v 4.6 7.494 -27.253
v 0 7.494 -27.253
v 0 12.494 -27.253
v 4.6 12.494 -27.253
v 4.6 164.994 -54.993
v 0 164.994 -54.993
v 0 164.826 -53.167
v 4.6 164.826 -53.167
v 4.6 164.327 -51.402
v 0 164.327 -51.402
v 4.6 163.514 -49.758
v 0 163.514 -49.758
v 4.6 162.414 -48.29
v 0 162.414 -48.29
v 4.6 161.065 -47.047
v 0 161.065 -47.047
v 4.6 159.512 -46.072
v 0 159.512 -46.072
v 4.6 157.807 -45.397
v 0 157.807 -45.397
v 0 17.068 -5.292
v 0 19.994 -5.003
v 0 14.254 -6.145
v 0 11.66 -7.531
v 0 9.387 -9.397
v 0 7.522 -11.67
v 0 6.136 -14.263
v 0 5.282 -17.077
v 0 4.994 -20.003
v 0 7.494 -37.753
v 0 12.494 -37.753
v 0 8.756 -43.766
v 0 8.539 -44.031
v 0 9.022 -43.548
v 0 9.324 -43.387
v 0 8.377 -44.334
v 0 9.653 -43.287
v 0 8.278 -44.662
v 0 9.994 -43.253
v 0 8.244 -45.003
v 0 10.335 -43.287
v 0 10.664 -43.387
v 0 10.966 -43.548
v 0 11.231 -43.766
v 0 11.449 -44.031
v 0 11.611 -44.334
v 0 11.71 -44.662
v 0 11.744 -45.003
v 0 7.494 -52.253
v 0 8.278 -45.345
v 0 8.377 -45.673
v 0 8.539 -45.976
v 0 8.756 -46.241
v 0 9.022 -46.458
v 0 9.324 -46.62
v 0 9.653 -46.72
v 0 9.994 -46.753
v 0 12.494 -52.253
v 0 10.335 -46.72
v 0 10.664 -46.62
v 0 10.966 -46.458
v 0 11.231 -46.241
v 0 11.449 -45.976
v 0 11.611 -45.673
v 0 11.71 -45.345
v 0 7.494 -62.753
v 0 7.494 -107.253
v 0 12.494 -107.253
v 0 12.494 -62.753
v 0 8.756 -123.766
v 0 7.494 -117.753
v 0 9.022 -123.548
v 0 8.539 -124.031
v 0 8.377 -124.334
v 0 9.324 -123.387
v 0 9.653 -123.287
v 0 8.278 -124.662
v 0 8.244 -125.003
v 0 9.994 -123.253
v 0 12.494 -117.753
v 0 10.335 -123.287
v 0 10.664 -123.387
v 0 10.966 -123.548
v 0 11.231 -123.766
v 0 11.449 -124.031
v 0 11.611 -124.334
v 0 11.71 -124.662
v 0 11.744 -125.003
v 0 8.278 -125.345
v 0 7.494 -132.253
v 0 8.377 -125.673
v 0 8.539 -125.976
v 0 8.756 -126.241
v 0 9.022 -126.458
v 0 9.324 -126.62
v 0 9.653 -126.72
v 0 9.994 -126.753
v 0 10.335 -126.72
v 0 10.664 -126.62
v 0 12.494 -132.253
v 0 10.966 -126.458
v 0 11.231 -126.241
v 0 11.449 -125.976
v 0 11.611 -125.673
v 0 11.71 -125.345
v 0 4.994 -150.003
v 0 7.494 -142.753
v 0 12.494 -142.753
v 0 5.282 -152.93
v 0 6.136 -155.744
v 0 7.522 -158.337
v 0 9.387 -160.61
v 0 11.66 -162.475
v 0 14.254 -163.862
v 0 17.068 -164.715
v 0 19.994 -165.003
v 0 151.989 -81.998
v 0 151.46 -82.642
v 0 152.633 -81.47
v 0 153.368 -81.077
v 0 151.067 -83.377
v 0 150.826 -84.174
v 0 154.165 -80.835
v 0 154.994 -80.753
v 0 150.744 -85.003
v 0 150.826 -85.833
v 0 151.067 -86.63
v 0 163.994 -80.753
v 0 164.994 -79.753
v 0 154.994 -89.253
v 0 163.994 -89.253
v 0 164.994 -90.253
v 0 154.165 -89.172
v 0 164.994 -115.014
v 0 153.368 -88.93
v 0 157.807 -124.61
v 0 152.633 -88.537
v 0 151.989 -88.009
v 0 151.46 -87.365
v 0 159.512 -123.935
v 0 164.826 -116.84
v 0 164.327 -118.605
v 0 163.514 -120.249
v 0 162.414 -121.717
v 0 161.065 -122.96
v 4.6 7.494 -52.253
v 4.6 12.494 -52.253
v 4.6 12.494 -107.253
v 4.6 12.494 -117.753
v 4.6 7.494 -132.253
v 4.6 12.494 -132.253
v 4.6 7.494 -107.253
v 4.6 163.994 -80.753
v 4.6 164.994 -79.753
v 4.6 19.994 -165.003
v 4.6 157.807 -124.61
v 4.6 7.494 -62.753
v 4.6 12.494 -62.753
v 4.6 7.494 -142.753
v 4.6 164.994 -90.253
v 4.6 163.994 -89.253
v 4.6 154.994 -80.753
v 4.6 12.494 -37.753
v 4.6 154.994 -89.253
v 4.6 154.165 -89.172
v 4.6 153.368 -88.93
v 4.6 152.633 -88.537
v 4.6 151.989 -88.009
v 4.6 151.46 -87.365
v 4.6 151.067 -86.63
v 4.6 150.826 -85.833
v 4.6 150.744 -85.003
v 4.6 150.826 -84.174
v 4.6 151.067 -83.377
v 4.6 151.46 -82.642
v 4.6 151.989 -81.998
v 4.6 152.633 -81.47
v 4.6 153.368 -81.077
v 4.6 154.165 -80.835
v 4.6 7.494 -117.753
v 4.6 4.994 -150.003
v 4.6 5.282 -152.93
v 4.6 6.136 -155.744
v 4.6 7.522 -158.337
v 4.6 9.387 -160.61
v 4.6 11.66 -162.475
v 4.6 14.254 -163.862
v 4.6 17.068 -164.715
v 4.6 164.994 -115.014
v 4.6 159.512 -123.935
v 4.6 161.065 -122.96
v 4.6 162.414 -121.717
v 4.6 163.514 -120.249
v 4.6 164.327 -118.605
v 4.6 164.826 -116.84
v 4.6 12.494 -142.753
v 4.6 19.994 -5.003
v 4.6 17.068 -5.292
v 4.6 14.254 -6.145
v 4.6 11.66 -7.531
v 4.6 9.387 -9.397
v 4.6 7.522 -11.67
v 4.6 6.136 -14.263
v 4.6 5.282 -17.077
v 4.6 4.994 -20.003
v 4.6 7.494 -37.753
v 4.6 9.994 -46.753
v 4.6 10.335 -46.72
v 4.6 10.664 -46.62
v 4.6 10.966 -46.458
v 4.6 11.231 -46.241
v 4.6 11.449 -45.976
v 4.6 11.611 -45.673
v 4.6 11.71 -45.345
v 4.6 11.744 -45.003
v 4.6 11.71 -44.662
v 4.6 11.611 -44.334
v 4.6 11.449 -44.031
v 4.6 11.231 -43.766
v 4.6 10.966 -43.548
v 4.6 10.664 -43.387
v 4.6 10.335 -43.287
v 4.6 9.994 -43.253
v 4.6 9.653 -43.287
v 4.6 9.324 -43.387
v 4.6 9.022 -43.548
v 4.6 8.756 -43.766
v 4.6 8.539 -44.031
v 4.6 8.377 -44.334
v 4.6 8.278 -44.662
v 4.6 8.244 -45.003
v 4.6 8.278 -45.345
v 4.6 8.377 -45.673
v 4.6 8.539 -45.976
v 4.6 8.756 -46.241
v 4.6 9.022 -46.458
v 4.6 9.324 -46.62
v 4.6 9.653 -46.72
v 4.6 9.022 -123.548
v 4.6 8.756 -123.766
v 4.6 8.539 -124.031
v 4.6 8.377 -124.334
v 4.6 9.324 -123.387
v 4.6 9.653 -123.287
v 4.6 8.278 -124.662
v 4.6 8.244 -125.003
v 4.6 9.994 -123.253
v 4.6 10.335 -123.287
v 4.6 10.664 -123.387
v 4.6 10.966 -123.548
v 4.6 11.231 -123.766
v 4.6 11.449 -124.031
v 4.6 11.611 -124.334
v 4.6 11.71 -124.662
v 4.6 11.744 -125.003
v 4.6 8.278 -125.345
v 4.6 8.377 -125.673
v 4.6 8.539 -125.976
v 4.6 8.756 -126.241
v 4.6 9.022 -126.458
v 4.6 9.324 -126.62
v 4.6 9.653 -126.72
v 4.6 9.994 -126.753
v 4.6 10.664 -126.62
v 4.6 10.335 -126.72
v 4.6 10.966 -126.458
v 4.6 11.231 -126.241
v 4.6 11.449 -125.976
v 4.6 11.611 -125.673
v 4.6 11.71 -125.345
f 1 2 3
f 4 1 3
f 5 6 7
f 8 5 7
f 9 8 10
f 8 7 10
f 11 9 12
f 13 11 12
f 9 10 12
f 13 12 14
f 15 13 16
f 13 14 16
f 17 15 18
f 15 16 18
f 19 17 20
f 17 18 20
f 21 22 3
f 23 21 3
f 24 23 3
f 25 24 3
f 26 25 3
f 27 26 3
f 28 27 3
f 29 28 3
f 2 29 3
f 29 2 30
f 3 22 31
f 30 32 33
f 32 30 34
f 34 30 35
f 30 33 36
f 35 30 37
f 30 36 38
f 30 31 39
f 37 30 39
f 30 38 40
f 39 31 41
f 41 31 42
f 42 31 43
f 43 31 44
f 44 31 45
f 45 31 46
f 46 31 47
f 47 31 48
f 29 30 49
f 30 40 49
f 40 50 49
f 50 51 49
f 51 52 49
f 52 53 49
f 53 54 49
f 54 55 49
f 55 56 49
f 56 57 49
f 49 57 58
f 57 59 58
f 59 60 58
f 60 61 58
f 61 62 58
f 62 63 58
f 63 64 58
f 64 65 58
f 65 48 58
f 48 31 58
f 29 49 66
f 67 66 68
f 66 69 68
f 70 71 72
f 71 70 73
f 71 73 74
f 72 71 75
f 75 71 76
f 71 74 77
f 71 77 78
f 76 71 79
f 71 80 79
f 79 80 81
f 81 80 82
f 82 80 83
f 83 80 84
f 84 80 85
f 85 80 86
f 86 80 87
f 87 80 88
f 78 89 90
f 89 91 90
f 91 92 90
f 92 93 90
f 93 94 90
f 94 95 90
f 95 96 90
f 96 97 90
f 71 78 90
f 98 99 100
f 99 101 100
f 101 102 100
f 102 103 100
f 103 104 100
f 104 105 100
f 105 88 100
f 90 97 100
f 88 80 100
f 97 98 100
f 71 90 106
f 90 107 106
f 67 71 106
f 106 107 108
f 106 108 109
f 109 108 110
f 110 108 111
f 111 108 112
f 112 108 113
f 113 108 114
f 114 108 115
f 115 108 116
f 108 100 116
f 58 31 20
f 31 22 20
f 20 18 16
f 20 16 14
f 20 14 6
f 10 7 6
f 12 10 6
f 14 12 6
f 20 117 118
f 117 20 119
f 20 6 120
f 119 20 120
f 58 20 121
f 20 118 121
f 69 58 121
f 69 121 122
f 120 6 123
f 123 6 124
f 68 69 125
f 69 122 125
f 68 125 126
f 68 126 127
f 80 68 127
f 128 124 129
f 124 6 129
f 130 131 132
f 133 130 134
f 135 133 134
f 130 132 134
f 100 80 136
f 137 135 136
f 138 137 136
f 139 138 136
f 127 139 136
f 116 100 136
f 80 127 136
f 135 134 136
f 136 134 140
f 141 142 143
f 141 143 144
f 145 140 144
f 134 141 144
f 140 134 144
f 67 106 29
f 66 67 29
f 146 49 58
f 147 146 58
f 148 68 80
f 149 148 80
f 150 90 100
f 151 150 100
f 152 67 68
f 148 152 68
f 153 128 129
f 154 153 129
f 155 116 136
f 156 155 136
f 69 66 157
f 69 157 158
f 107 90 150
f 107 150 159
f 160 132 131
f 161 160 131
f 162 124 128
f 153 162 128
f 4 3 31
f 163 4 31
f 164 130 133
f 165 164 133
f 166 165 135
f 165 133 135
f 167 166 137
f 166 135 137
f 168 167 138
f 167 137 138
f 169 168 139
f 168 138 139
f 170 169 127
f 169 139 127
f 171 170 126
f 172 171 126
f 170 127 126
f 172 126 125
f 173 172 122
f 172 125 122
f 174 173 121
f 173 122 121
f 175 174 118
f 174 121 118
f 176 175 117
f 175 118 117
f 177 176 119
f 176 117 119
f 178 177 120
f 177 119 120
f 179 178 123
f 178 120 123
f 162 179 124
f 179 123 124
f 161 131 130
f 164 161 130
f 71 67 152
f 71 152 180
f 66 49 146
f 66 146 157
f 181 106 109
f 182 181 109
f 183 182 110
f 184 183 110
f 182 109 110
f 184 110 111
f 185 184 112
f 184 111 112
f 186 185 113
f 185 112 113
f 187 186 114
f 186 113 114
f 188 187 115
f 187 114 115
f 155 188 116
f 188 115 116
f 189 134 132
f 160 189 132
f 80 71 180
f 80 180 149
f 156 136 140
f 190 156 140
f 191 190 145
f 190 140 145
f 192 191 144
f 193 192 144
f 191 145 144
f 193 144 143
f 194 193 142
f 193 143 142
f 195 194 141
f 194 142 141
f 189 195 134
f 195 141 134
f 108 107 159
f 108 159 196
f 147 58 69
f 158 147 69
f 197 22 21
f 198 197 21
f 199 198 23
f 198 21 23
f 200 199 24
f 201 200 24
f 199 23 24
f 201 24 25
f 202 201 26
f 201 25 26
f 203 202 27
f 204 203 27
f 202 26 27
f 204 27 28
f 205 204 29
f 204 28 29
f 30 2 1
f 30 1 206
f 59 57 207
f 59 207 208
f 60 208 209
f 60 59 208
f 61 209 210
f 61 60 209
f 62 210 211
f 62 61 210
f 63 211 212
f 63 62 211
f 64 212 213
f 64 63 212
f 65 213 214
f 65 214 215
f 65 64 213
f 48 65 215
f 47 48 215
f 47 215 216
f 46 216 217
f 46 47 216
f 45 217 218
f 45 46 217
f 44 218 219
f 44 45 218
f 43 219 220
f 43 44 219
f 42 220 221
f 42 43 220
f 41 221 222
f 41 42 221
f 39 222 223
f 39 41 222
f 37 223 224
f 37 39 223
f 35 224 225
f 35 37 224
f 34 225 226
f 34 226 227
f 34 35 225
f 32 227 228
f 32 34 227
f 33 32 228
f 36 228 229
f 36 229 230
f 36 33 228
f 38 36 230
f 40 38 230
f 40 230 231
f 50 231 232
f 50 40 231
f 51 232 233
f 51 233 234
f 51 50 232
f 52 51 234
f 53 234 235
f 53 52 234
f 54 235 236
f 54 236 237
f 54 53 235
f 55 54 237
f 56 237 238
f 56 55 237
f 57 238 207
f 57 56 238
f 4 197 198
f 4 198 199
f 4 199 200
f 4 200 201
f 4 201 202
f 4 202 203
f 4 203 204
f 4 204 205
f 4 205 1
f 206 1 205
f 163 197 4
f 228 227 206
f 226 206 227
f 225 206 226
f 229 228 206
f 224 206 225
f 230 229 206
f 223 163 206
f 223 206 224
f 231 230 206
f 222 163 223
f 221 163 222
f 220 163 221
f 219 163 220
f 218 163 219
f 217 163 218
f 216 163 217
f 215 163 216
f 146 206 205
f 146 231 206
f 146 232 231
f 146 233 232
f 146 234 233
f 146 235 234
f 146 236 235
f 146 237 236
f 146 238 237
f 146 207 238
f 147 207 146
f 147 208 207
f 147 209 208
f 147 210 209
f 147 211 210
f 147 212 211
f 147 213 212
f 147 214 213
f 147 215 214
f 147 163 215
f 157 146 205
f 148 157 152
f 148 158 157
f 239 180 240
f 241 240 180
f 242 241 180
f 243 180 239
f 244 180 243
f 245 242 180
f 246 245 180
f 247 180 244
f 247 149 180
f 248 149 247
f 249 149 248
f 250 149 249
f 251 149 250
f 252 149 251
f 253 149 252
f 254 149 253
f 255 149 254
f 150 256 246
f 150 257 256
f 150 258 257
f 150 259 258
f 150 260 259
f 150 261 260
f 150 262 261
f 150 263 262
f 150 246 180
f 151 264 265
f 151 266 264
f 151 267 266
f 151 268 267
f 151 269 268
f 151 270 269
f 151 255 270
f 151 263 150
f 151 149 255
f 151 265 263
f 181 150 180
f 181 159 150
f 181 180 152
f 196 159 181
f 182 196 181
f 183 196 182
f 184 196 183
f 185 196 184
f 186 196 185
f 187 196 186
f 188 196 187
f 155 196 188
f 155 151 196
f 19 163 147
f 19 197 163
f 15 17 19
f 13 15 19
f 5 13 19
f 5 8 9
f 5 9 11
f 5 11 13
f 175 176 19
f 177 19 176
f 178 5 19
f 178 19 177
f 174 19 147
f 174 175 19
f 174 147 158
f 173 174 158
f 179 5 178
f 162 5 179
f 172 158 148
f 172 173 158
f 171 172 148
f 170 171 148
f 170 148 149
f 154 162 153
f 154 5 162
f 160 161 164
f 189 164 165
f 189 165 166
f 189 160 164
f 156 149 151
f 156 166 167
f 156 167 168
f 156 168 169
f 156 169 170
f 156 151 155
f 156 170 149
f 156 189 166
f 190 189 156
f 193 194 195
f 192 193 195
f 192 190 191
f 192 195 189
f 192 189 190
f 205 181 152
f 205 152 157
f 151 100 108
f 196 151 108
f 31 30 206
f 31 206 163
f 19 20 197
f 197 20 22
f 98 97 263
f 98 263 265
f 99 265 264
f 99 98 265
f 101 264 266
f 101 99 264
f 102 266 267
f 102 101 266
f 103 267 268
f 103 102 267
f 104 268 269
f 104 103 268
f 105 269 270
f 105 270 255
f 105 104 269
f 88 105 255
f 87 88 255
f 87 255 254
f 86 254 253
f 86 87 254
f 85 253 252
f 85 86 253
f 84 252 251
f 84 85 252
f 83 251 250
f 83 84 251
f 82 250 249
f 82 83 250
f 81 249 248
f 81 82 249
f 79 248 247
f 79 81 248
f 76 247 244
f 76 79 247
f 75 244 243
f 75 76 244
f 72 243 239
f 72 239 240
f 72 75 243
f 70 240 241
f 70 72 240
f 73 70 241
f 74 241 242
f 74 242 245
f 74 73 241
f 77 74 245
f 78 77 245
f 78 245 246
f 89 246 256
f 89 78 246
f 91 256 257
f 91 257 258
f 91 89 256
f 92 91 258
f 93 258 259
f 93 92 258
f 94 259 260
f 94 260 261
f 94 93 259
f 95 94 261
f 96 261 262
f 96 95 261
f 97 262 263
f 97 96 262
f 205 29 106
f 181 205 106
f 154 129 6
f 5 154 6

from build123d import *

# Parameters (mm, degrees)
SKETCH1_R      = 1.75
SKETCH1_W      = 10.5
SKETCH1_H      = 5
EXTRUDE1_DEPTH = 4.6


with BuildPart() as part:
    # Sketch1 → Extrude1 (new body)
    with BuildSketch(Plane(origin=(0, 0, 0), x_dir=(0, 0, -1), z_dir=(1, 0, 0))):
        with BuildLine():
            Line((20.003411378, 4.993919491), (150.003411378, 4.993919491))
            ThreePointArc((150.003411378, 4.993919491), (160.610013096, 9.387317773), (165.003411378, 19.993919491))
            Line((165.003411378, 19.993919491), (124.610032516, 157.806623844))
            ThreePointArc((124.610032516, 157.806623844), (121.008451259, 162.997888617), (115.013747077, 164.993919491))
            Line((115.013747077, 164.993919491), (90.253411378, 164.993919491))
            Line((90.253411378, 164.993919491), (89.253411378, 163.993919491))
            Line((89.253411378, 163.993919491), (89.253411378, 154.993919491))
            ThreePointArc((89.253411378, 154.993919491), (85.003411378, 150.743919491), (80.753411378, 154.993919491))
            Line((80.753411378, 154.993919491), (80.753411378, 163.993919491))
            Line((80.753411378, 163.993919491), (79.753411378, 164.993919491))
            Line((79.753411378, 164.993919491), (54.993075679, 164.993919491))
            ThreePointArc((54.993075679, 164.993919491), (48.998371496, 162.997888617), (45.39679024, 157.806623844))
            Line((45.39679024, 157.806623844), (5.003411378, 19.993919491))
            ThreePointArc((5.003411378, 19.993919491), (9.39680966, 9.387317773), (20.003411378, 4.993919491))
        make_face()
        with Locations((45.003411378, 9.993919491)):
            Circle(SKETCH1_R, mode=Mode.SUBTRACT)
        with Locations((125.003411378, 9.993919491)):
            Circle(SKETCH1_R, mode=Mode.SUBTRACT)
        with Locations((32.503411378, 9.993919491)):
            Rectangle(SKETCH1_W, SKETCH1_H, mode=Mode.SUBTRACT)
        with Locations((57.503411378, 9.993919491)):
            Rectangle(SKETCH1_W, SKETCH1_H, mode=Mode.SUBTRACT)
        with Locations((137.503411378, 9.993919491)):
            Rectangle(SKETCH1_W, SKETCH1_H, mode=Mode.SUBTRACT)
        with Locations((112.503411378, 9.993919491)):
            Rectangle(SKETCH1_W, SKETCH1_H, mode=Mode.SUBTRACT)
    extrude(amount=EXTRUDE1_DEPTH)


solid = part.part
